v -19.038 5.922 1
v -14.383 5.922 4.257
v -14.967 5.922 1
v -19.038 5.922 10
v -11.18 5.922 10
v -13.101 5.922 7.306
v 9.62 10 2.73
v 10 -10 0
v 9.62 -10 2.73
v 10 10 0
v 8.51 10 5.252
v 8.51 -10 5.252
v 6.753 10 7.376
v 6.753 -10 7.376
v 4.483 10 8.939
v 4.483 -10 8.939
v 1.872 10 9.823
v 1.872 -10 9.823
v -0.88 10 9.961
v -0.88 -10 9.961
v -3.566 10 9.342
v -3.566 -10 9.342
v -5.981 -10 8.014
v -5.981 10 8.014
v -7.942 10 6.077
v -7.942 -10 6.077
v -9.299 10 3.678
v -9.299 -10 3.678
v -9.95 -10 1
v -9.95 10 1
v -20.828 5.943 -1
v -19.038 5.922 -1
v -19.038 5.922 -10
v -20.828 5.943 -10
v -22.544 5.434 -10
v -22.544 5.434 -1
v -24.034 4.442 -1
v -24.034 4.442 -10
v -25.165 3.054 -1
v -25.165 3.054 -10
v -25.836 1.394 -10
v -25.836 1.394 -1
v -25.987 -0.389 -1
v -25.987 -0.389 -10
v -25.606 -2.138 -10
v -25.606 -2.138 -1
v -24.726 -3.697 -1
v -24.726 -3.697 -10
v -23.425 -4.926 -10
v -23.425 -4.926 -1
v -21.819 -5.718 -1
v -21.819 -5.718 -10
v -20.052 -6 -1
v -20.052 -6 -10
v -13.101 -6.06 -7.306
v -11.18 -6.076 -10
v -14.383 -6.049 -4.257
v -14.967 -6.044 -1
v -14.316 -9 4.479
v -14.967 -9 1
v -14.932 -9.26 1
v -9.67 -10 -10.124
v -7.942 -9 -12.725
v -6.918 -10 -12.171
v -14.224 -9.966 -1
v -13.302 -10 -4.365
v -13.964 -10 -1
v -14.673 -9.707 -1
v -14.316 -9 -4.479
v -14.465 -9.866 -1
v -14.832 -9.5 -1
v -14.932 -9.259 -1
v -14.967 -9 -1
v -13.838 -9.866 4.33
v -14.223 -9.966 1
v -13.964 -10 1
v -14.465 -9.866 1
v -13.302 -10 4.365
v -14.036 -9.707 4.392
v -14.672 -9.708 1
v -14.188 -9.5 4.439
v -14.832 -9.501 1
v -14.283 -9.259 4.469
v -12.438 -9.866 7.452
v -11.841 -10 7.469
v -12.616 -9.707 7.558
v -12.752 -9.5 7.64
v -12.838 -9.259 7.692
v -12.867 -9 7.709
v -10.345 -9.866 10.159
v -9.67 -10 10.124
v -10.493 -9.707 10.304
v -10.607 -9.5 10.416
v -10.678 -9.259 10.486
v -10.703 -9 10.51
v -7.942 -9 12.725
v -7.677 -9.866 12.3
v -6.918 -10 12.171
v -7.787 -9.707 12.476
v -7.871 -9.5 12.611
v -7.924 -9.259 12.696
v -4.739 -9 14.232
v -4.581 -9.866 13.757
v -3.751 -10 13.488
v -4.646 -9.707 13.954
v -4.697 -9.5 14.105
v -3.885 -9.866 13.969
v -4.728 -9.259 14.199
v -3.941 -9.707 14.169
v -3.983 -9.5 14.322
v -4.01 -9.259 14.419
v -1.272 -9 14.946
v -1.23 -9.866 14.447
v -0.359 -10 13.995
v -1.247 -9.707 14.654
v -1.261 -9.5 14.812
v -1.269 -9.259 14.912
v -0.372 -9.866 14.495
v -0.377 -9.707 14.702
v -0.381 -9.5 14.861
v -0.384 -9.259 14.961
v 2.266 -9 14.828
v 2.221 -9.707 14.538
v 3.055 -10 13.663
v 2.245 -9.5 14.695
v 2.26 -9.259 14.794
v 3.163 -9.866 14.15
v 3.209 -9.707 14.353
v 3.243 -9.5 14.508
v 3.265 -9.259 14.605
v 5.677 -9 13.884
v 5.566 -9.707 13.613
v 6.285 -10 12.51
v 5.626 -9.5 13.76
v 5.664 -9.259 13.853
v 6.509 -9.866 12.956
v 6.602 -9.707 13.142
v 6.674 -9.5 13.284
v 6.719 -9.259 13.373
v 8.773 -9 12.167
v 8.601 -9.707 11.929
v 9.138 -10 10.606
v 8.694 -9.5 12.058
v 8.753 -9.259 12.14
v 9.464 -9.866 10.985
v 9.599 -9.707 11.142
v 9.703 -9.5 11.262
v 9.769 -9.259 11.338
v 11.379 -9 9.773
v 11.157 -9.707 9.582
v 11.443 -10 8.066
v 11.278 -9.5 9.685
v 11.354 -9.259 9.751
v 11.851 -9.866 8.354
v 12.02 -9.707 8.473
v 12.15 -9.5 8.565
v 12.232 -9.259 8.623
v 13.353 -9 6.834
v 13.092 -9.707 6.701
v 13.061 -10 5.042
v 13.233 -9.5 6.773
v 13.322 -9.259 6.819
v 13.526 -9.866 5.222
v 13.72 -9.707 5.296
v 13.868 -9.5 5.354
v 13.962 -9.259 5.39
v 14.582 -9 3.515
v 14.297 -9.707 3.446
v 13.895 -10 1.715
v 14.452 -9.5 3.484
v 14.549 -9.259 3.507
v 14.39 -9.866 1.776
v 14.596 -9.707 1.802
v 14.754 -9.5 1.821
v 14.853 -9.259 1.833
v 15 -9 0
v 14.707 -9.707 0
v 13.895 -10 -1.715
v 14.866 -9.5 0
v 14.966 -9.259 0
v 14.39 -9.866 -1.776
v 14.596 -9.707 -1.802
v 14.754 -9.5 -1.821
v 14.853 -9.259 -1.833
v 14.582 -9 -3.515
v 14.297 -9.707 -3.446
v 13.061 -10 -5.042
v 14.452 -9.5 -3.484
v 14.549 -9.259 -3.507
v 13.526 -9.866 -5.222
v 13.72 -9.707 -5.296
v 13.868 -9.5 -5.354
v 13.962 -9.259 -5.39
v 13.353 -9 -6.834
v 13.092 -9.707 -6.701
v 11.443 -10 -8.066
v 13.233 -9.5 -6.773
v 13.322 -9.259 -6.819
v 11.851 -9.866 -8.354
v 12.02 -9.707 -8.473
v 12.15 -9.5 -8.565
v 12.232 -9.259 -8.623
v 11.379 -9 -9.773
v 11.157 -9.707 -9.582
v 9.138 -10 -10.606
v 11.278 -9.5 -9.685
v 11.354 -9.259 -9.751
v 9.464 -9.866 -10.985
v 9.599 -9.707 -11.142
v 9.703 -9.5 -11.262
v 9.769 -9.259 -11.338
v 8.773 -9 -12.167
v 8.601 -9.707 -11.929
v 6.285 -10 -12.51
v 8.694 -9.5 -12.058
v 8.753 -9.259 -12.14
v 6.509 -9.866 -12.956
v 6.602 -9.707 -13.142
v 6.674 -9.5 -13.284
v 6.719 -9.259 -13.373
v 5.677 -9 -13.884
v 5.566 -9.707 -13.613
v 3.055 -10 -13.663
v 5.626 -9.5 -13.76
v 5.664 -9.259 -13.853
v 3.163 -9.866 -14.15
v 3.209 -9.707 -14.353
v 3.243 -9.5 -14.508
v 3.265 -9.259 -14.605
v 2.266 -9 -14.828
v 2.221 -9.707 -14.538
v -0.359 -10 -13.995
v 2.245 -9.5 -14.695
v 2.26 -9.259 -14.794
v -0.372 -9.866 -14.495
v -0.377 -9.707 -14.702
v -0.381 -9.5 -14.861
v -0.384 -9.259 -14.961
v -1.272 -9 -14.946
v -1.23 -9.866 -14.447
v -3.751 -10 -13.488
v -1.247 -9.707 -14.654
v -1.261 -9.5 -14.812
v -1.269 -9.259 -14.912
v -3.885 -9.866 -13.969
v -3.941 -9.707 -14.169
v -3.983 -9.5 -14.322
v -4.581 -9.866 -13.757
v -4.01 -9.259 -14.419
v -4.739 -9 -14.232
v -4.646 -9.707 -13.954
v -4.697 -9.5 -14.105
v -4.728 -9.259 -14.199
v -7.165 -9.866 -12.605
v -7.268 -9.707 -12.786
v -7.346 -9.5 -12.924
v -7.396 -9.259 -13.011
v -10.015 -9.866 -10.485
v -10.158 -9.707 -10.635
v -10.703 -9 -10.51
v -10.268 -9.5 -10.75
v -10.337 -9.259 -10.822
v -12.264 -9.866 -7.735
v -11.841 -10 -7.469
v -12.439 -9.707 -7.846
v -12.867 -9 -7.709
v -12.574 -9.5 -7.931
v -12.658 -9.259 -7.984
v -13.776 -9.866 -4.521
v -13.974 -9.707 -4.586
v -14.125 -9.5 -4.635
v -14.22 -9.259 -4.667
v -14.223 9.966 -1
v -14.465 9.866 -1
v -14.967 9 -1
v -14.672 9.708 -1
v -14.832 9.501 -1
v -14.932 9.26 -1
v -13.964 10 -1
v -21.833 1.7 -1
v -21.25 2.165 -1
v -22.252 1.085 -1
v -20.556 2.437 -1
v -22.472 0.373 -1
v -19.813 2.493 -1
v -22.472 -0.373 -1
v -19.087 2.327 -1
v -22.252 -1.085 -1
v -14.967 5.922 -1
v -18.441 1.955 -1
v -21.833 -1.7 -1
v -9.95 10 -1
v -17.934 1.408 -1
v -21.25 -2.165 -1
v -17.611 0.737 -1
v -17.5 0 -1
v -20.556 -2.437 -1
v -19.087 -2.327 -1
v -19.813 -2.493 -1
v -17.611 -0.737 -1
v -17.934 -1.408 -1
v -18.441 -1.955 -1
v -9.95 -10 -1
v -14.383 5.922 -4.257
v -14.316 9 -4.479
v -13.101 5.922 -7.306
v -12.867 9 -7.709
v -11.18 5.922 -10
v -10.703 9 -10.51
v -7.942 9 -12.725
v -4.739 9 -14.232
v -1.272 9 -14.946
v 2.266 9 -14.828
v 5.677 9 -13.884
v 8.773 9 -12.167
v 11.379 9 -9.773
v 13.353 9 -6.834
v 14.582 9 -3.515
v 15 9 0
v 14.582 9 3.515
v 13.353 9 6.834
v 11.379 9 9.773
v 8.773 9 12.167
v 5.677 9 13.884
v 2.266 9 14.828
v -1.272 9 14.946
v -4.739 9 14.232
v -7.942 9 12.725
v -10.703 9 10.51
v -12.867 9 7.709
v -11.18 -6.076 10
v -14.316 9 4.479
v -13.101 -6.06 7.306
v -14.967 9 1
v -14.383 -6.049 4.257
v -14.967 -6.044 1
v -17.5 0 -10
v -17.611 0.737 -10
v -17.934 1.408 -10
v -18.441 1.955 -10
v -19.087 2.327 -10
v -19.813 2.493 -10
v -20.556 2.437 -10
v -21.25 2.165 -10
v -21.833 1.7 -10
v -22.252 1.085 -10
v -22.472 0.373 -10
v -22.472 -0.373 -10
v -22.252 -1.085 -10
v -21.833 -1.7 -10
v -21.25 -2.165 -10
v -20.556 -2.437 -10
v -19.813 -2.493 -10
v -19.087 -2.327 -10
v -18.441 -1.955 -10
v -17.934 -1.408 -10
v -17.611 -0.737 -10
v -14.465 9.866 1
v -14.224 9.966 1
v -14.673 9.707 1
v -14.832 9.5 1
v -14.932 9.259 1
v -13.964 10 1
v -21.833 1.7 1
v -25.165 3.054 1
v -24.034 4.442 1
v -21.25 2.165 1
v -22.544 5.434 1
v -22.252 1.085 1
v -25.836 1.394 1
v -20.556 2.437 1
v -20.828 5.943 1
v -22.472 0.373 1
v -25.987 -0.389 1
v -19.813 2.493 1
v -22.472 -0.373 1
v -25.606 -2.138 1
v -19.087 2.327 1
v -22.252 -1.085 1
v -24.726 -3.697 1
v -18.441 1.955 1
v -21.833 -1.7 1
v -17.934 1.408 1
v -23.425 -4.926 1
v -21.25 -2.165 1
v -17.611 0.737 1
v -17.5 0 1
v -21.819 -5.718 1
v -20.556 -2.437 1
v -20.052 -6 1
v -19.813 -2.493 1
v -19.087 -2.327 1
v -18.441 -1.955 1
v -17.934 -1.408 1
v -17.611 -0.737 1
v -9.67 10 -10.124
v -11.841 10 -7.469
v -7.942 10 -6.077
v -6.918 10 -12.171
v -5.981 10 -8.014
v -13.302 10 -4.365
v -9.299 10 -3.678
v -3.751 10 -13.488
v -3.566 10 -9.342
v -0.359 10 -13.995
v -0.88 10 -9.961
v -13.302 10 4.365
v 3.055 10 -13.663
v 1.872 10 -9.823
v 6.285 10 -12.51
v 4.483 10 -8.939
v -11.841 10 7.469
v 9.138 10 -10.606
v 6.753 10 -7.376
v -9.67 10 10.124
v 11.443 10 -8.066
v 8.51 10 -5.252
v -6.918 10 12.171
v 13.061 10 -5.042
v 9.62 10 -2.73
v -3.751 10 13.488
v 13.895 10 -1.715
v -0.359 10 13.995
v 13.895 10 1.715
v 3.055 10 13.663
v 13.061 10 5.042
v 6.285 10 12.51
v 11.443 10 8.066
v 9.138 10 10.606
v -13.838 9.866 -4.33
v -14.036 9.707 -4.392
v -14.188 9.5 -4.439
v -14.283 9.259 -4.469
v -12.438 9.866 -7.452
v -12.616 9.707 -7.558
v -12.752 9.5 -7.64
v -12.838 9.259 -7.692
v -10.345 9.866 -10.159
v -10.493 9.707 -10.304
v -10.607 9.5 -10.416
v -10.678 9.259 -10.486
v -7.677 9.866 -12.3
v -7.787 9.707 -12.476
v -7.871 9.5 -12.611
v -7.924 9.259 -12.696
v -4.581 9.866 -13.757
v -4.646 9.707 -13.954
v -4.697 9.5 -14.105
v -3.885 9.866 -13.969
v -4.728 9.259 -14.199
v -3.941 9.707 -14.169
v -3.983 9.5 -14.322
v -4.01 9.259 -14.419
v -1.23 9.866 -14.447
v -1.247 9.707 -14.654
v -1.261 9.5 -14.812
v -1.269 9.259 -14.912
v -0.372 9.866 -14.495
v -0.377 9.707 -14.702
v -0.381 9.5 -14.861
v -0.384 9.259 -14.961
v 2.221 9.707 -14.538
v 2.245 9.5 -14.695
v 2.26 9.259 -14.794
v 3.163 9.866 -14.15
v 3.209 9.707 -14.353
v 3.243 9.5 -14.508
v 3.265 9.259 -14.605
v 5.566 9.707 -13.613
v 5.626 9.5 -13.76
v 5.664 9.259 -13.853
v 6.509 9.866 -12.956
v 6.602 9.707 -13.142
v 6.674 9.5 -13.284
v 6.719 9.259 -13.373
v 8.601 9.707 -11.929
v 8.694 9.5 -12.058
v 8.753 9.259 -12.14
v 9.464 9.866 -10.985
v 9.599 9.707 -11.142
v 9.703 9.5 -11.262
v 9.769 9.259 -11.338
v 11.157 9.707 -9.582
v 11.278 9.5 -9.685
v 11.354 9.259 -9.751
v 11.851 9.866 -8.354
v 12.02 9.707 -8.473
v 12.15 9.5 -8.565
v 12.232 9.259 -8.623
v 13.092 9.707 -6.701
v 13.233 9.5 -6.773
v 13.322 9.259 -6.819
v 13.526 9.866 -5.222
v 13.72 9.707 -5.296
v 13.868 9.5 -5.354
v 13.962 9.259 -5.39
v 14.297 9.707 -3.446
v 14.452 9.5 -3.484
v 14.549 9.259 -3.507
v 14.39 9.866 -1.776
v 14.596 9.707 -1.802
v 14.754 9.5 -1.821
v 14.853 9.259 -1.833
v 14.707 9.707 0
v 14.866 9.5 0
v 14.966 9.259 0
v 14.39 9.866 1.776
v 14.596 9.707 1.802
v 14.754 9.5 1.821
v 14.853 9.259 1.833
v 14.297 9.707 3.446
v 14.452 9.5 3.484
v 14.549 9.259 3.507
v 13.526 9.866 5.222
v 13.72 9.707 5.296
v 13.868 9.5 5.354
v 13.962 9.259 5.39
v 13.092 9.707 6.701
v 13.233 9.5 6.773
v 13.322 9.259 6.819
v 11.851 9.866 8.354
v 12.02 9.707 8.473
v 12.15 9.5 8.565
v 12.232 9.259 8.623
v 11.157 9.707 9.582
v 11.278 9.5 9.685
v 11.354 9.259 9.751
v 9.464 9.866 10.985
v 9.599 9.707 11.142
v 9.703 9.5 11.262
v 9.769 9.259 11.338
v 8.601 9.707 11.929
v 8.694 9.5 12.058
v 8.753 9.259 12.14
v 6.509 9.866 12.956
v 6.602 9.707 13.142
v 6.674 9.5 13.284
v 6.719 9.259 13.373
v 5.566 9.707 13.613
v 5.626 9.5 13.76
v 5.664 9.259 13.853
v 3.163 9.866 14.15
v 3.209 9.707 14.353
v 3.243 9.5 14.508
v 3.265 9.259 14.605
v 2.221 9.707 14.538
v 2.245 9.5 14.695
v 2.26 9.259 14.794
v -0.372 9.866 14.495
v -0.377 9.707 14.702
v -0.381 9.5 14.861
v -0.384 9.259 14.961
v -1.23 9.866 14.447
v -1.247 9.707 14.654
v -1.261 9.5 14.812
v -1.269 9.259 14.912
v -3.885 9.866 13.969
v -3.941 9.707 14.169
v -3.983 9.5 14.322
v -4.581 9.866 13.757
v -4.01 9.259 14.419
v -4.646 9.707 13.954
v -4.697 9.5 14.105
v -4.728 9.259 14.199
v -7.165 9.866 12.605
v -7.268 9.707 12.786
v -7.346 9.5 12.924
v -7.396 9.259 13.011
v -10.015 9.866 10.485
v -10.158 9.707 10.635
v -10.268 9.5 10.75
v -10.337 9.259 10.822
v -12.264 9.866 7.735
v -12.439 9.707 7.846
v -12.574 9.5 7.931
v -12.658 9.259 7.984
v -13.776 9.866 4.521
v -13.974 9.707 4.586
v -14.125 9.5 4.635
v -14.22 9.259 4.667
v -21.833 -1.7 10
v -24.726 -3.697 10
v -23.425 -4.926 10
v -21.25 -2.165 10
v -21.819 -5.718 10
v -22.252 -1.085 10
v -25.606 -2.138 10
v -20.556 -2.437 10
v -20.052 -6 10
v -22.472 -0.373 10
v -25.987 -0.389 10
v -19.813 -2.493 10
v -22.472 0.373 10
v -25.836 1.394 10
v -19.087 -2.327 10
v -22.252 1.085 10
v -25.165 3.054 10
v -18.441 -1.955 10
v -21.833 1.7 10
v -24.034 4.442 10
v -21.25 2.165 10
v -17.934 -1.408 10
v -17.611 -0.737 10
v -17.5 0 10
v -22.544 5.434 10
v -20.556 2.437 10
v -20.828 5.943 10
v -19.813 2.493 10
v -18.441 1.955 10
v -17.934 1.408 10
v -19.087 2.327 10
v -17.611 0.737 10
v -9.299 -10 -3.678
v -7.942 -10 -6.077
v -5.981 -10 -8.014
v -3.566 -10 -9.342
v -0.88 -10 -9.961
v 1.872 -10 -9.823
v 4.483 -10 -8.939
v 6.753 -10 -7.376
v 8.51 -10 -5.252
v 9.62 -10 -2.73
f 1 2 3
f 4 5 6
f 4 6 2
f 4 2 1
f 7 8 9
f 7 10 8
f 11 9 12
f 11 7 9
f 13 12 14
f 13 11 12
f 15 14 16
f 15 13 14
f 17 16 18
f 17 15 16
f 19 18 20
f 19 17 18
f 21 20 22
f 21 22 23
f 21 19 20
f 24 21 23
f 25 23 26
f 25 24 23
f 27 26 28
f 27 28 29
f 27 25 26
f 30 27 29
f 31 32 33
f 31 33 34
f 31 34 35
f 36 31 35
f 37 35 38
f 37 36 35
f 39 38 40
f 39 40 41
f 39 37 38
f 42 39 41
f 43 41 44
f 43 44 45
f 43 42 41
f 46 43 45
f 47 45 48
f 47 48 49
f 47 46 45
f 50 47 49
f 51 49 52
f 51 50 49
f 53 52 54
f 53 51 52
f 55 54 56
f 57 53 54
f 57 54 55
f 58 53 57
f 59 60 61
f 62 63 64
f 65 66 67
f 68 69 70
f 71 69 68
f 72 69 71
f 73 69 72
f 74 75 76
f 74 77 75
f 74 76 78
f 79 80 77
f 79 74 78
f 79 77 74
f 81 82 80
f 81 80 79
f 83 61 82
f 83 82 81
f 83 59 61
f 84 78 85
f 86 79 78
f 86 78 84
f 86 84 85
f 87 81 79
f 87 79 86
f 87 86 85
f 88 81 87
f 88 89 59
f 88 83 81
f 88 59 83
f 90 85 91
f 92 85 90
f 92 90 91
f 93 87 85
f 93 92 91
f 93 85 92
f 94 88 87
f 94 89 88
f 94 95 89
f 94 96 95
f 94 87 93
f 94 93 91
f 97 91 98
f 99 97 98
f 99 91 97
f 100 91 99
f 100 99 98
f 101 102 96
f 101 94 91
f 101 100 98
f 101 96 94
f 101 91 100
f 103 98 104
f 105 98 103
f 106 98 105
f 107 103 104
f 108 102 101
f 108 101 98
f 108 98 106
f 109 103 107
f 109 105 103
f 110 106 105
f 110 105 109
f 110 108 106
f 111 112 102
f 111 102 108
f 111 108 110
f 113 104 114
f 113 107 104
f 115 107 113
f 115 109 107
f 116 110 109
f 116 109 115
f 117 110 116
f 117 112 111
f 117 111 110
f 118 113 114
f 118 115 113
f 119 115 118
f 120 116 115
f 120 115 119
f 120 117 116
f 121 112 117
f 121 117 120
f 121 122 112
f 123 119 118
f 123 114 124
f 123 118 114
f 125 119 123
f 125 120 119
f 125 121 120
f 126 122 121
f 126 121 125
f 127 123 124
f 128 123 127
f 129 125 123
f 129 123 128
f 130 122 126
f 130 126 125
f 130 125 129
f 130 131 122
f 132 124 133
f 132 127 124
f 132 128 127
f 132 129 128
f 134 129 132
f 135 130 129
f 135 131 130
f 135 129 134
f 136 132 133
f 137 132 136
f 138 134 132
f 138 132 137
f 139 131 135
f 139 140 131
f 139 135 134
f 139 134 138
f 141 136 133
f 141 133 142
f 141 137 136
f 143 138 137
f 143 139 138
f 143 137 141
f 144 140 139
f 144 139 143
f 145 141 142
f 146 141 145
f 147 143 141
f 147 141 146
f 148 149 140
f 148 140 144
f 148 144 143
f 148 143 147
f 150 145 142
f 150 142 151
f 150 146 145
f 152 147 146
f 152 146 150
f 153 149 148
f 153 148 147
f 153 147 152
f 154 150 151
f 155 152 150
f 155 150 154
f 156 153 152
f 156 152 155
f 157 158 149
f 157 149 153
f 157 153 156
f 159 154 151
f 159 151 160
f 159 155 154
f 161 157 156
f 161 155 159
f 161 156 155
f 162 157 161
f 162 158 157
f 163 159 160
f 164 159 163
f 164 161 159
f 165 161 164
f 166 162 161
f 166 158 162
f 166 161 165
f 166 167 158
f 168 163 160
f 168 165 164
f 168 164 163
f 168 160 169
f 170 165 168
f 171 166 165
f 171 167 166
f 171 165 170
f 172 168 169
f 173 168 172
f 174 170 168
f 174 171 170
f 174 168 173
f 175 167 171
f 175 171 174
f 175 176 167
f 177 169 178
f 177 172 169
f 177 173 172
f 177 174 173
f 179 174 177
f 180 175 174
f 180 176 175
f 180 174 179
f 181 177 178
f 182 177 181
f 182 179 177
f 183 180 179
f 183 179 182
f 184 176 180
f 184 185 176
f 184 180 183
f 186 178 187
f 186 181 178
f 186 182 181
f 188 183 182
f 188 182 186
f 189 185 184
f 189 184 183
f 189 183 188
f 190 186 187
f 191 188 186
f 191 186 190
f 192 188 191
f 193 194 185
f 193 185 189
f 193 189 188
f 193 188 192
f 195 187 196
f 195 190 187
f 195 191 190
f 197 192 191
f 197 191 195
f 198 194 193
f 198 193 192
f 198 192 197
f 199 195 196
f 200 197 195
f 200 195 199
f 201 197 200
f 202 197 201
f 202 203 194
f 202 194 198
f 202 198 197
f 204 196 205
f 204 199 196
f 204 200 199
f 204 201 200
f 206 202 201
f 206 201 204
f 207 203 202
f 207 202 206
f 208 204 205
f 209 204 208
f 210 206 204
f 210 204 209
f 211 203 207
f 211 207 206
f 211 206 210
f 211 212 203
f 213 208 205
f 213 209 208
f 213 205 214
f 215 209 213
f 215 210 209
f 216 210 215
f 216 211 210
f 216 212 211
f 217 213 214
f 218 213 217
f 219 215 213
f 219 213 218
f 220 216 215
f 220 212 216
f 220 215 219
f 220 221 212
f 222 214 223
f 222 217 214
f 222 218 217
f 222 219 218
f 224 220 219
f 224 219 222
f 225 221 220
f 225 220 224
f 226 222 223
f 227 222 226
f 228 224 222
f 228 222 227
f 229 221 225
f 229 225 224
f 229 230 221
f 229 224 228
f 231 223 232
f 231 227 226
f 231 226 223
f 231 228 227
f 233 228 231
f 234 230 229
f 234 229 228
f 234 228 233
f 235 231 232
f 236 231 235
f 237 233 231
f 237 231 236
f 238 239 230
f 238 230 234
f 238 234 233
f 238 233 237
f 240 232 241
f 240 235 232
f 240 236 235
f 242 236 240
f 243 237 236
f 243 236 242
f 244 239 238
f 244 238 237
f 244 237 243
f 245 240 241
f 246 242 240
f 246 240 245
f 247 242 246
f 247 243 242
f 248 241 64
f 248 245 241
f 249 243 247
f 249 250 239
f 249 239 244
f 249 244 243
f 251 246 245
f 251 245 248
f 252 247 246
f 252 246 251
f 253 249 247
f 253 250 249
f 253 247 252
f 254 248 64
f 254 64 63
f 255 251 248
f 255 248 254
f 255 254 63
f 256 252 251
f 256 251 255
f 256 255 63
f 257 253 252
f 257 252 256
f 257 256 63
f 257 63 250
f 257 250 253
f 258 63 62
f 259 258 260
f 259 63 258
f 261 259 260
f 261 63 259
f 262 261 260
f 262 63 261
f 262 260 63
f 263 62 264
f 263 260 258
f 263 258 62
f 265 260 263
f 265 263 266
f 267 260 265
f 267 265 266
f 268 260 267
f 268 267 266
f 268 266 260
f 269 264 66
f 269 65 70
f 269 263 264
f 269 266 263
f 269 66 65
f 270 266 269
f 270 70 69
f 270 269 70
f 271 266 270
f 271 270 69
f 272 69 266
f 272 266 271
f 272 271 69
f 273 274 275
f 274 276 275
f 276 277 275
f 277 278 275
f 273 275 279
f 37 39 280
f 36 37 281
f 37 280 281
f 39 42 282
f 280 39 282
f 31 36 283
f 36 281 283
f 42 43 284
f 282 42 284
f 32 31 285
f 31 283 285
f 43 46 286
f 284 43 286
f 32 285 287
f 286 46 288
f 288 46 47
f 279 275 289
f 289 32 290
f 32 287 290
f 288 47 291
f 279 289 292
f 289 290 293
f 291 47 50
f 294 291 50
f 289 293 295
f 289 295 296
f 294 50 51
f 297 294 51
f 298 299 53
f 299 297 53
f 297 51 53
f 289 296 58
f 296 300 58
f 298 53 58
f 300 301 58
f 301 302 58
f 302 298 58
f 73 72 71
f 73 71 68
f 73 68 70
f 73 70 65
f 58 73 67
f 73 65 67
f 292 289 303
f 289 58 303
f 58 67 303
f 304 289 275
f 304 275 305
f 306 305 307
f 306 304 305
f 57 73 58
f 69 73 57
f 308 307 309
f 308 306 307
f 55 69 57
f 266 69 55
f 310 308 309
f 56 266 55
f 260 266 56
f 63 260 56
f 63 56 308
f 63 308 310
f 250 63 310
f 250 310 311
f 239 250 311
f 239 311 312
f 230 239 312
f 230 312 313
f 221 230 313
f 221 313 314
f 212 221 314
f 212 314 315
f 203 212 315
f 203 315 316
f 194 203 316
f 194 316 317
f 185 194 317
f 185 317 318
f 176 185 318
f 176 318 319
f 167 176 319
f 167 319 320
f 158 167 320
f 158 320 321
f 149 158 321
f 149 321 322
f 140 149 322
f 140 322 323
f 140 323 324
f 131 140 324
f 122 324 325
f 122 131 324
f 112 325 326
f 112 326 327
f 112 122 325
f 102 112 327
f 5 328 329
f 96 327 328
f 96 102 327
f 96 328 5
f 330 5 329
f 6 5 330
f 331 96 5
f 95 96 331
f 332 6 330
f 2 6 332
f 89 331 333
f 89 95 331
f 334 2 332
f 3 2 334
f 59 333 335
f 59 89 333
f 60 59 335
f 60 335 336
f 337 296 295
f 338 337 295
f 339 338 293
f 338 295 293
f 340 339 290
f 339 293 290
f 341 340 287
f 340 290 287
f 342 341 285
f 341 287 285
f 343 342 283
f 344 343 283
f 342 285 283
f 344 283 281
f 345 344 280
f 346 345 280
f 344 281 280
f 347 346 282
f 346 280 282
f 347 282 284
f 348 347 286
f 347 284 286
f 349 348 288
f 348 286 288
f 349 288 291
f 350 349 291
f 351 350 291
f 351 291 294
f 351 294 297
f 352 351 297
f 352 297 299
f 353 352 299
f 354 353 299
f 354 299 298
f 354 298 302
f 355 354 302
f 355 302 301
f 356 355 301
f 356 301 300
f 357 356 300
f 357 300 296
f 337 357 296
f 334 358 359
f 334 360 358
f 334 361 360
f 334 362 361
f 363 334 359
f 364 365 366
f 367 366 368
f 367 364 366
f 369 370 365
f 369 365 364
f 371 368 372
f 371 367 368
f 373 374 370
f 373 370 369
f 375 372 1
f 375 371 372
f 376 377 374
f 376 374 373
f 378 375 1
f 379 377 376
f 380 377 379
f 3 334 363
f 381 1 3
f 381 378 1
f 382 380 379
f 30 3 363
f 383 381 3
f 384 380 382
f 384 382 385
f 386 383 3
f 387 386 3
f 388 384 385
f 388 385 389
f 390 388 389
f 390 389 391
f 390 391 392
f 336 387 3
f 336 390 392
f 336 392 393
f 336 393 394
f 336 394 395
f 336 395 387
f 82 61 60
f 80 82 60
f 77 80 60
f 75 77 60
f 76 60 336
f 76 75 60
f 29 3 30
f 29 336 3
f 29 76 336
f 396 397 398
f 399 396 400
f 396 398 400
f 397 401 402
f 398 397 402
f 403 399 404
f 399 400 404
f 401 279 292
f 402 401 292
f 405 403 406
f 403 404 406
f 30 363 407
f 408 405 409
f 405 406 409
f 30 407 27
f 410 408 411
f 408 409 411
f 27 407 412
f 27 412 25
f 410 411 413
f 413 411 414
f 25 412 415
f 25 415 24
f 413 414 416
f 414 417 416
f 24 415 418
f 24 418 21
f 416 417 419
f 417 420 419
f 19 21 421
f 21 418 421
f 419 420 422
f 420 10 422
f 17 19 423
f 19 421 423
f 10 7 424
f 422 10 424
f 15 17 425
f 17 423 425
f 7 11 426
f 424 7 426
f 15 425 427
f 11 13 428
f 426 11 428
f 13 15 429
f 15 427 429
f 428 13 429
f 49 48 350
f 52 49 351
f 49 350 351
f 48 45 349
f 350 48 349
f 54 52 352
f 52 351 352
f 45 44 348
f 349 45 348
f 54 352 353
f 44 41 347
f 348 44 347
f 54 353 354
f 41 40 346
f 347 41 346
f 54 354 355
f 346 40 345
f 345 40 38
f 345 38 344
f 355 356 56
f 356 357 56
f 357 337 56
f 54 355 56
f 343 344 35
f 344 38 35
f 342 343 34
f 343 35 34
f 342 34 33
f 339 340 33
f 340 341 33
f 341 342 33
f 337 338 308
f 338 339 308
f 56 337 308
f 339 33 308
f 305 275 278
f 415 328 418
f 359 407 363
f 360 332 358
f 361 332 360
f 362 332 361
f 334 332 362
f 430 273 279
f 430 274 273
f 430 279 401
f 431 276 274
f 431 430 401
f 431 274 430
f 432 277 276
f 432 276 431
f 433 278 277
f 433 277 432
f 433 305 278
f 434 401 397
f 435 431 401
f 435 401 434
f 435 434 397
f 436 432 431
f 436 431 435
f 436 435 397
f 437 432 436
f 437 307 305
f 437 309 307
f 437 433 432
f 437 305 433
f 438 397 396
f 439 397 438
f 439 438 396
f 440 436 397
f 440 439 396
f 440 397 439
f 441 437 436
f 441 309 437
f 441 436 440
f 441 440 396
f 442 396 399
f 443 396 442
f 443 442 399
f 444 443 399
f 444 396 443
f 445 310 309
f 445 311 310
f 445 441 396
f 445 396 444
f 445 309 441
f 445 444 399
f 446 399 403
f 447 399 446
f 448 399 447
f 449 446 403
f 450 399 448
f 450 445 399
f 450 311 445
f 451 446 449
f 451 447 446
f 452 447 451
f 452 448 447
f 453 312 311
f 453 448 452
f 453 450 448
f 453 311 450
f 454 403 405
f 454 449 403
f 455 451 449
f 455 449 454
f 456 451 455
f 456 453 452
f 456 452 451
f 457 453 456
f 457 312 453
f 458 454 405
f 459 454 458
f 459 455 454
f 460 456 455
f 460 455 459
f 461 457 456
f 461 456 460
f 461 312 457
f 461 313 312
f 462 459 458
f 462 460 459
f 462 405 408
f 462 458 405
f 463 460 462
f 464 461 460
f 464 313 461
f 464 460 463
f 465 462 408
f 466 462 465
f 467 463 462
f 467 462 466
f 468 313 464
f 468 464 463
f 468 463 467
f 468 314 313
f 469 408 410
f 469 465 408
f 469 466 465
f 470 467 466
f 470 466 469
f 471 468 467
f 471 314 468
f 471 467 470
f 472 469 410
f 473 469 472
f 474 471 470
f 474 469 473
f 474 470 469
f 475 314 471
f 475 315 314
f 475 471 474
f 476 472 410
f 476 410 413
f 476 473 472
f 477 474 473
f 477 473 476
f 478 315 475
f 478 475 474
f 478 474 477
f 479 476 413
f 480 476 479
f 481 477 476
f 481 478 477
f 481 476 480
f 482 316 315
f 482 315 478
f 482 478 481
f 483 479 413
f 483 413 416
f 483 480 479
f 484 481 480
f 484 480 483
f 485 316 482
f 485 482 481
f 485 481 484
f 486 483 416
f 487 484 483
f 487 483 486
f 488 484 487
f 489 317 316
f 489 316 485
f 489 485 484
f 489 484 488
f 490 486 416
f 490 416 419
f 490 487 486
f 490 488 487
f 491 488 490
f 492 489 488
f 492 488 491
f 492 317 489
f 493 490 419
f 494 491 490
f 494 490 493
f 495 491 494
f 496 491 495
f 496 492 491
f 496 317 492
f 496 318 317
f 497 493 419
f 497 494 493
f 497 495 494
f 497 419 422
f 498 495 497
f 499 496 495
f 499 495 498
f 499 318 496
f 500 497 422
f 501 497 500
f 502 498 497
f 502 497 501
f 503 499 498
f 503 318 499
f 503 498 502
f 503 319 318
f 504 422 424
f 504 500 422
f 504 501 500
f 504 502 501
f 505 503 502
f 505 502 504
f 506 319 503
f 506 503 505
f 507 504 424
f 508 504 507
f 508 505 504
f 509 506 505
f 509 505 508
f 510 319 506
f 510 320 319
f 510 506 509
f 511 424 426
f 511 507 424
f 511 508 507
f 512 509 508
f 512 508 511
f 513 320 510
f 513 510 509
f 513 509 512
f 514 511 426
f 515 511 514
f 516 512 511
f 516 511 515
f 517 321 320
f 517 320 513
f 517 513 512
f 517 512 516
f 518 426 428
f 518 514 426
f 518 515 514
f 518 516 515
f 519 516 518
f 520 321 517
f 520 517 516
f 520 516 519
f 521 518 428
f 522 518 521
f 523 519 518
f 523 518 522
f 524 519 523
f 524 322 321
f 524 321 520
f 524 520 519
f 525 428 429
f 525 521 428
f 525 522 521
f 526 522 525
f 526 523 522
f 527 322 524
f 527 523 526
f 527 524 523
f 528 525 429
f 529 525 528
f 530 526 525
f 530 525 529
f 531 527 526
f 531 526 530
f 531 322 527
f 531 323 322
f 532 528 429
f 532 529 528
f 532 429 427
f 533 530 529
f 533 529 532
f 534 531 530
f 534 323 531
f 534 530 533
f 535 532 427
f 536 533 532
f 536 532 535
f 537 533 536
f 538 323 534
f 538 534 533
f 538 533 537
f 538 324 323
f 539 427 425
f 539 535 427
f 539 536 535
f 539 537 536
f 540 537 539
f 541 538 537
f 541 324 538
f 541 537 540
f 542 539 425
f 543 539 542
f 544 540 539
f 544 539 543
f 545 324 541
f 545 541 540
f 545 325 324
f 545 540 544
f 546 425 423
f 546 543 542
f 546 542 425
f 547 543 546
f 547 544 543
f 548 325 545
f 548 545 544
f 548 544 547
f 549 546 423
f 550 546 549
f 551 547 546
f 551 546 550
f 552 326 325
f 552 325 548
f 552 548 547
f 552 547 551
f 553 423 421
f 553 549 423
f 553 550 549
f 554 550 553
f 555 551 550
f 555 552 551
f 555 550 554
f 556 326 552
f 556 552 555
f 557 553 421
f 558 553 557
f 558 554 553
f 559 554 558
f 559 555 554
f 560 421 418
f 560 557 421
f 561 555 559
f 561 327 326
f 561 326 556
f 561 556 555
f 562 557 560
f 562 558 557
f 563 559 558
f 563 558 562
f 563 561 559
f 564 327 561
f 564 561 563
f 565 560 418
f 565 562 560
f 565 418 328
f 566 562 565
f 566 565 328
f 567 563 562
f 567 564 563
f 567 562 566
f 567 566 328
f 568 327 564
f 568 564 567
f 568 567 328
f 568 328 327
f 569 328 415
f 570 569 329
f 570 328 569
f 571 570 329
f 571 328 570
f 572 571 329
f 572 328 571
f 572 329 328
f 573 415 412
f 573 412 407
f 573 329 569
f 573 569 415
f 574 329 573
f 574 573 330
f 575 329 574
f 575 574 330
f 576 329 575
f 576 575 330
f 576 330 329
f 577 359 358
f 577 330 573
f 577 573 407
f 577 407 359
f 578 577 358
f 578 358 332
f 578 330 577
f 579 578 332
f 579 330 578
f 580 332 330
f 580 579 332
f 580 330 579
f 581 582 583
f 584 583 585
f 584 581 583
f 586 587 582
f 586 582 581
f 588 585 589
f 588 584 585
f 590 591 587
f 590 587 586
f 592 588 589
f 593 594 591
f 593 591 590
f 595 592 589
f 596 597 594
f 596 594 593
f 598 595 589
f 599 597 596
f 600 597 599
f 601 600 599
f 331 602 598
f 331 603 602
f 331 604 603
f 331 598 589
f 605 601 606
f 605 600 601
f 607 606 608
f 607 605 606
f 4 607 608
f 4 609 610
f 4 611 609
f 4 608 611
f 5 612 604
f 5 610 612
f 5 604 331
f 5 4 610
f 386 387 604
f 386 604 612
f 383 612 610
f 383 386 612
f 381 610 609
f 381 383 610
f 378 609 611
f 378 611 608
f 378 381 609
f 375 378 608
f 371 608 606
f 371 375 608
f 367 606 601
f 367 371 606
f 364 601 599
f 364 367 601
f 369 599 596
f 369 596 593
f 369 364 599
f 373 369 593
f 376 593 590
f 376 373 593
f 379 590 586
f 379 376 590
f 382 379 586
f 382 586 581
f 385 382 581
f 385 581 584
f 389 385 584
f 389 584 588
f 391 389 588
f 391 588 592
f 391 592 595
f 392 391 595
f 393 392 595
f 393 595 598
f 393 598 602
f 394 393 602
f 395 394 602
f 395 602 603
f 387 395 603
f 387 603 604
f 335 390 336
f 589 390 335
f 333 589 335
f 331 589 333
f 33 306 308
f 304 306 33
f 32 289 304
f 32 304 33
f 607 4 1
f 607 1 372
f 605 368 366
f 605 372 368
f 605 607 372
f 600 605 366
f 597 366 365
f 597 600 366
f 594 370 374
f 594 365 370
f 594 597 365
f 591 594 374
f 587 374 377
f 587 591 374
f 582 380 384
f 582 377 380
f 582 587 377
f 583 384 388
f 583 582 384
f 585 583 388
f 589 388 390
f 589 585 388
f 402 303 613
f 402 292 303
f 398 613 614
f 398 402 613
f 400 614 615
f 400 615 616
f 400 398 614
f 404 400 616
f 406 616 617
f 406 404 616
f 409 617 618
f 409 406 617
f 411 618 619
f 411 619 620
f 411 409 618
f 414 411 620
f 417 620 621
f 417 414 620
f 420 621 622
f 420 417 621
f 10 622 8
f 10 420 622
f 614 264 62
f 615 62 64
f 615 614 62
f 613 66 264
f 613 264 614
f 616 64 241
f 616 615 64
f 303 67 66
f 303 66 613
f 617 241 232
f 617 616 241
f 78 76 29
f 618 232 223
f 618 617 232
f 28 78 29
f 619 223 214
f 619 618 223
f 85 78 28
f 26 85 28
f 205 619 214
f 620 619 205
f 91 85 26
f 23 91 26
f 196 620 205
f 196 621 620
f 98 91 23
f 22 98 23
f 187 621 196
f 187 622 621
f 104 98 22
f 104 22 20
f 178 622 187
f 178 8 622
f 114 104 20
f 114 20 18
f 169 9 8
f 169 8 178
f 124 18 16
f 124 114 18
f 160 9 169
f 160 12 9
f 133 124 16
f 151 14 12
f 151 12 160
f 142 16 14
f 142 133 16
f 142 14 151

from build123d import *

# Parameters (mm, degrees)
F0_R          = 15
F0_R_2        = 10
F1_DEPTH      = 10
F1_DEPTH_BACK = 10
F2_R          = 2.5
F3_DEPTH      = 10
F3_DEPTH_BACK = 10
F4_W          = 50
F4_H          = 2
F5_DEPTH      = 25
F5_DEPTH_BACK = 25
F6_R          = 1


with BuildPart() as f1:
    # F0 (on Front) → F1 (new body, two sides)
    with BuildSketch(Plane.XZ) as f1_sk:
        Circle(F0_R)
        Circle(F0_R_2, mode=Mode.SUBTRACT)
    extrude(amount=F1_DEPTH)
    extrude(f1_sk.sketch, amount=-F1_DEPTH_BACK)

    # F2 (on Top) → F3 (join, two sides)
    with BuildSketch(Plane.XY) as f3_sk:
        with BuildLine():
            Line((-10.9971821198, 5.9223911099), (-19.0380834019, 5.9223911099))
            ThreePointArc((-19.0380834019, 5.9223911099), (-25.9784366079, 0.5082280244), (-20.0515892658, -5.9997782082))
            Line((-20.0515892658, -5.9997782082), (-11, -6.0776085593))
            Line((-11, -6.0776085593), (-10.9971821198, 5.9223911099))
        make_face()
        with Locations((-20, 0)):
            Circle(F2_R, mode=Mode.SUBTRACT)
    extrude(amount=F3_DEPTH)
    extrude(f3_sk.sketch, amount=-F3_DEPTH_BACK)

    # F4 (on Front) → F5 (cut, two sides)
    with BuildSketch(Plane.XZ) as f5_sk:
        with Locations((-31.5975938924, 0)):
            Rectangle(F4_W, F4_H)
    extrude(amount=-F5_DEPTH, mode=Mode.SUBTRACT)
    extrude(f5_sk.sketch, amount=F5_DEPTH_BACK, mode=Mode.SUBTRACT)

    # F6
    f6_edges = [f1.edges().sort_by_distance(p)[0] for p in [
        (15, -10, 0),
        (15, 10, 0),
    ]]
    fillet(f6_edges, radius=F6_R)


solid = f1.part
